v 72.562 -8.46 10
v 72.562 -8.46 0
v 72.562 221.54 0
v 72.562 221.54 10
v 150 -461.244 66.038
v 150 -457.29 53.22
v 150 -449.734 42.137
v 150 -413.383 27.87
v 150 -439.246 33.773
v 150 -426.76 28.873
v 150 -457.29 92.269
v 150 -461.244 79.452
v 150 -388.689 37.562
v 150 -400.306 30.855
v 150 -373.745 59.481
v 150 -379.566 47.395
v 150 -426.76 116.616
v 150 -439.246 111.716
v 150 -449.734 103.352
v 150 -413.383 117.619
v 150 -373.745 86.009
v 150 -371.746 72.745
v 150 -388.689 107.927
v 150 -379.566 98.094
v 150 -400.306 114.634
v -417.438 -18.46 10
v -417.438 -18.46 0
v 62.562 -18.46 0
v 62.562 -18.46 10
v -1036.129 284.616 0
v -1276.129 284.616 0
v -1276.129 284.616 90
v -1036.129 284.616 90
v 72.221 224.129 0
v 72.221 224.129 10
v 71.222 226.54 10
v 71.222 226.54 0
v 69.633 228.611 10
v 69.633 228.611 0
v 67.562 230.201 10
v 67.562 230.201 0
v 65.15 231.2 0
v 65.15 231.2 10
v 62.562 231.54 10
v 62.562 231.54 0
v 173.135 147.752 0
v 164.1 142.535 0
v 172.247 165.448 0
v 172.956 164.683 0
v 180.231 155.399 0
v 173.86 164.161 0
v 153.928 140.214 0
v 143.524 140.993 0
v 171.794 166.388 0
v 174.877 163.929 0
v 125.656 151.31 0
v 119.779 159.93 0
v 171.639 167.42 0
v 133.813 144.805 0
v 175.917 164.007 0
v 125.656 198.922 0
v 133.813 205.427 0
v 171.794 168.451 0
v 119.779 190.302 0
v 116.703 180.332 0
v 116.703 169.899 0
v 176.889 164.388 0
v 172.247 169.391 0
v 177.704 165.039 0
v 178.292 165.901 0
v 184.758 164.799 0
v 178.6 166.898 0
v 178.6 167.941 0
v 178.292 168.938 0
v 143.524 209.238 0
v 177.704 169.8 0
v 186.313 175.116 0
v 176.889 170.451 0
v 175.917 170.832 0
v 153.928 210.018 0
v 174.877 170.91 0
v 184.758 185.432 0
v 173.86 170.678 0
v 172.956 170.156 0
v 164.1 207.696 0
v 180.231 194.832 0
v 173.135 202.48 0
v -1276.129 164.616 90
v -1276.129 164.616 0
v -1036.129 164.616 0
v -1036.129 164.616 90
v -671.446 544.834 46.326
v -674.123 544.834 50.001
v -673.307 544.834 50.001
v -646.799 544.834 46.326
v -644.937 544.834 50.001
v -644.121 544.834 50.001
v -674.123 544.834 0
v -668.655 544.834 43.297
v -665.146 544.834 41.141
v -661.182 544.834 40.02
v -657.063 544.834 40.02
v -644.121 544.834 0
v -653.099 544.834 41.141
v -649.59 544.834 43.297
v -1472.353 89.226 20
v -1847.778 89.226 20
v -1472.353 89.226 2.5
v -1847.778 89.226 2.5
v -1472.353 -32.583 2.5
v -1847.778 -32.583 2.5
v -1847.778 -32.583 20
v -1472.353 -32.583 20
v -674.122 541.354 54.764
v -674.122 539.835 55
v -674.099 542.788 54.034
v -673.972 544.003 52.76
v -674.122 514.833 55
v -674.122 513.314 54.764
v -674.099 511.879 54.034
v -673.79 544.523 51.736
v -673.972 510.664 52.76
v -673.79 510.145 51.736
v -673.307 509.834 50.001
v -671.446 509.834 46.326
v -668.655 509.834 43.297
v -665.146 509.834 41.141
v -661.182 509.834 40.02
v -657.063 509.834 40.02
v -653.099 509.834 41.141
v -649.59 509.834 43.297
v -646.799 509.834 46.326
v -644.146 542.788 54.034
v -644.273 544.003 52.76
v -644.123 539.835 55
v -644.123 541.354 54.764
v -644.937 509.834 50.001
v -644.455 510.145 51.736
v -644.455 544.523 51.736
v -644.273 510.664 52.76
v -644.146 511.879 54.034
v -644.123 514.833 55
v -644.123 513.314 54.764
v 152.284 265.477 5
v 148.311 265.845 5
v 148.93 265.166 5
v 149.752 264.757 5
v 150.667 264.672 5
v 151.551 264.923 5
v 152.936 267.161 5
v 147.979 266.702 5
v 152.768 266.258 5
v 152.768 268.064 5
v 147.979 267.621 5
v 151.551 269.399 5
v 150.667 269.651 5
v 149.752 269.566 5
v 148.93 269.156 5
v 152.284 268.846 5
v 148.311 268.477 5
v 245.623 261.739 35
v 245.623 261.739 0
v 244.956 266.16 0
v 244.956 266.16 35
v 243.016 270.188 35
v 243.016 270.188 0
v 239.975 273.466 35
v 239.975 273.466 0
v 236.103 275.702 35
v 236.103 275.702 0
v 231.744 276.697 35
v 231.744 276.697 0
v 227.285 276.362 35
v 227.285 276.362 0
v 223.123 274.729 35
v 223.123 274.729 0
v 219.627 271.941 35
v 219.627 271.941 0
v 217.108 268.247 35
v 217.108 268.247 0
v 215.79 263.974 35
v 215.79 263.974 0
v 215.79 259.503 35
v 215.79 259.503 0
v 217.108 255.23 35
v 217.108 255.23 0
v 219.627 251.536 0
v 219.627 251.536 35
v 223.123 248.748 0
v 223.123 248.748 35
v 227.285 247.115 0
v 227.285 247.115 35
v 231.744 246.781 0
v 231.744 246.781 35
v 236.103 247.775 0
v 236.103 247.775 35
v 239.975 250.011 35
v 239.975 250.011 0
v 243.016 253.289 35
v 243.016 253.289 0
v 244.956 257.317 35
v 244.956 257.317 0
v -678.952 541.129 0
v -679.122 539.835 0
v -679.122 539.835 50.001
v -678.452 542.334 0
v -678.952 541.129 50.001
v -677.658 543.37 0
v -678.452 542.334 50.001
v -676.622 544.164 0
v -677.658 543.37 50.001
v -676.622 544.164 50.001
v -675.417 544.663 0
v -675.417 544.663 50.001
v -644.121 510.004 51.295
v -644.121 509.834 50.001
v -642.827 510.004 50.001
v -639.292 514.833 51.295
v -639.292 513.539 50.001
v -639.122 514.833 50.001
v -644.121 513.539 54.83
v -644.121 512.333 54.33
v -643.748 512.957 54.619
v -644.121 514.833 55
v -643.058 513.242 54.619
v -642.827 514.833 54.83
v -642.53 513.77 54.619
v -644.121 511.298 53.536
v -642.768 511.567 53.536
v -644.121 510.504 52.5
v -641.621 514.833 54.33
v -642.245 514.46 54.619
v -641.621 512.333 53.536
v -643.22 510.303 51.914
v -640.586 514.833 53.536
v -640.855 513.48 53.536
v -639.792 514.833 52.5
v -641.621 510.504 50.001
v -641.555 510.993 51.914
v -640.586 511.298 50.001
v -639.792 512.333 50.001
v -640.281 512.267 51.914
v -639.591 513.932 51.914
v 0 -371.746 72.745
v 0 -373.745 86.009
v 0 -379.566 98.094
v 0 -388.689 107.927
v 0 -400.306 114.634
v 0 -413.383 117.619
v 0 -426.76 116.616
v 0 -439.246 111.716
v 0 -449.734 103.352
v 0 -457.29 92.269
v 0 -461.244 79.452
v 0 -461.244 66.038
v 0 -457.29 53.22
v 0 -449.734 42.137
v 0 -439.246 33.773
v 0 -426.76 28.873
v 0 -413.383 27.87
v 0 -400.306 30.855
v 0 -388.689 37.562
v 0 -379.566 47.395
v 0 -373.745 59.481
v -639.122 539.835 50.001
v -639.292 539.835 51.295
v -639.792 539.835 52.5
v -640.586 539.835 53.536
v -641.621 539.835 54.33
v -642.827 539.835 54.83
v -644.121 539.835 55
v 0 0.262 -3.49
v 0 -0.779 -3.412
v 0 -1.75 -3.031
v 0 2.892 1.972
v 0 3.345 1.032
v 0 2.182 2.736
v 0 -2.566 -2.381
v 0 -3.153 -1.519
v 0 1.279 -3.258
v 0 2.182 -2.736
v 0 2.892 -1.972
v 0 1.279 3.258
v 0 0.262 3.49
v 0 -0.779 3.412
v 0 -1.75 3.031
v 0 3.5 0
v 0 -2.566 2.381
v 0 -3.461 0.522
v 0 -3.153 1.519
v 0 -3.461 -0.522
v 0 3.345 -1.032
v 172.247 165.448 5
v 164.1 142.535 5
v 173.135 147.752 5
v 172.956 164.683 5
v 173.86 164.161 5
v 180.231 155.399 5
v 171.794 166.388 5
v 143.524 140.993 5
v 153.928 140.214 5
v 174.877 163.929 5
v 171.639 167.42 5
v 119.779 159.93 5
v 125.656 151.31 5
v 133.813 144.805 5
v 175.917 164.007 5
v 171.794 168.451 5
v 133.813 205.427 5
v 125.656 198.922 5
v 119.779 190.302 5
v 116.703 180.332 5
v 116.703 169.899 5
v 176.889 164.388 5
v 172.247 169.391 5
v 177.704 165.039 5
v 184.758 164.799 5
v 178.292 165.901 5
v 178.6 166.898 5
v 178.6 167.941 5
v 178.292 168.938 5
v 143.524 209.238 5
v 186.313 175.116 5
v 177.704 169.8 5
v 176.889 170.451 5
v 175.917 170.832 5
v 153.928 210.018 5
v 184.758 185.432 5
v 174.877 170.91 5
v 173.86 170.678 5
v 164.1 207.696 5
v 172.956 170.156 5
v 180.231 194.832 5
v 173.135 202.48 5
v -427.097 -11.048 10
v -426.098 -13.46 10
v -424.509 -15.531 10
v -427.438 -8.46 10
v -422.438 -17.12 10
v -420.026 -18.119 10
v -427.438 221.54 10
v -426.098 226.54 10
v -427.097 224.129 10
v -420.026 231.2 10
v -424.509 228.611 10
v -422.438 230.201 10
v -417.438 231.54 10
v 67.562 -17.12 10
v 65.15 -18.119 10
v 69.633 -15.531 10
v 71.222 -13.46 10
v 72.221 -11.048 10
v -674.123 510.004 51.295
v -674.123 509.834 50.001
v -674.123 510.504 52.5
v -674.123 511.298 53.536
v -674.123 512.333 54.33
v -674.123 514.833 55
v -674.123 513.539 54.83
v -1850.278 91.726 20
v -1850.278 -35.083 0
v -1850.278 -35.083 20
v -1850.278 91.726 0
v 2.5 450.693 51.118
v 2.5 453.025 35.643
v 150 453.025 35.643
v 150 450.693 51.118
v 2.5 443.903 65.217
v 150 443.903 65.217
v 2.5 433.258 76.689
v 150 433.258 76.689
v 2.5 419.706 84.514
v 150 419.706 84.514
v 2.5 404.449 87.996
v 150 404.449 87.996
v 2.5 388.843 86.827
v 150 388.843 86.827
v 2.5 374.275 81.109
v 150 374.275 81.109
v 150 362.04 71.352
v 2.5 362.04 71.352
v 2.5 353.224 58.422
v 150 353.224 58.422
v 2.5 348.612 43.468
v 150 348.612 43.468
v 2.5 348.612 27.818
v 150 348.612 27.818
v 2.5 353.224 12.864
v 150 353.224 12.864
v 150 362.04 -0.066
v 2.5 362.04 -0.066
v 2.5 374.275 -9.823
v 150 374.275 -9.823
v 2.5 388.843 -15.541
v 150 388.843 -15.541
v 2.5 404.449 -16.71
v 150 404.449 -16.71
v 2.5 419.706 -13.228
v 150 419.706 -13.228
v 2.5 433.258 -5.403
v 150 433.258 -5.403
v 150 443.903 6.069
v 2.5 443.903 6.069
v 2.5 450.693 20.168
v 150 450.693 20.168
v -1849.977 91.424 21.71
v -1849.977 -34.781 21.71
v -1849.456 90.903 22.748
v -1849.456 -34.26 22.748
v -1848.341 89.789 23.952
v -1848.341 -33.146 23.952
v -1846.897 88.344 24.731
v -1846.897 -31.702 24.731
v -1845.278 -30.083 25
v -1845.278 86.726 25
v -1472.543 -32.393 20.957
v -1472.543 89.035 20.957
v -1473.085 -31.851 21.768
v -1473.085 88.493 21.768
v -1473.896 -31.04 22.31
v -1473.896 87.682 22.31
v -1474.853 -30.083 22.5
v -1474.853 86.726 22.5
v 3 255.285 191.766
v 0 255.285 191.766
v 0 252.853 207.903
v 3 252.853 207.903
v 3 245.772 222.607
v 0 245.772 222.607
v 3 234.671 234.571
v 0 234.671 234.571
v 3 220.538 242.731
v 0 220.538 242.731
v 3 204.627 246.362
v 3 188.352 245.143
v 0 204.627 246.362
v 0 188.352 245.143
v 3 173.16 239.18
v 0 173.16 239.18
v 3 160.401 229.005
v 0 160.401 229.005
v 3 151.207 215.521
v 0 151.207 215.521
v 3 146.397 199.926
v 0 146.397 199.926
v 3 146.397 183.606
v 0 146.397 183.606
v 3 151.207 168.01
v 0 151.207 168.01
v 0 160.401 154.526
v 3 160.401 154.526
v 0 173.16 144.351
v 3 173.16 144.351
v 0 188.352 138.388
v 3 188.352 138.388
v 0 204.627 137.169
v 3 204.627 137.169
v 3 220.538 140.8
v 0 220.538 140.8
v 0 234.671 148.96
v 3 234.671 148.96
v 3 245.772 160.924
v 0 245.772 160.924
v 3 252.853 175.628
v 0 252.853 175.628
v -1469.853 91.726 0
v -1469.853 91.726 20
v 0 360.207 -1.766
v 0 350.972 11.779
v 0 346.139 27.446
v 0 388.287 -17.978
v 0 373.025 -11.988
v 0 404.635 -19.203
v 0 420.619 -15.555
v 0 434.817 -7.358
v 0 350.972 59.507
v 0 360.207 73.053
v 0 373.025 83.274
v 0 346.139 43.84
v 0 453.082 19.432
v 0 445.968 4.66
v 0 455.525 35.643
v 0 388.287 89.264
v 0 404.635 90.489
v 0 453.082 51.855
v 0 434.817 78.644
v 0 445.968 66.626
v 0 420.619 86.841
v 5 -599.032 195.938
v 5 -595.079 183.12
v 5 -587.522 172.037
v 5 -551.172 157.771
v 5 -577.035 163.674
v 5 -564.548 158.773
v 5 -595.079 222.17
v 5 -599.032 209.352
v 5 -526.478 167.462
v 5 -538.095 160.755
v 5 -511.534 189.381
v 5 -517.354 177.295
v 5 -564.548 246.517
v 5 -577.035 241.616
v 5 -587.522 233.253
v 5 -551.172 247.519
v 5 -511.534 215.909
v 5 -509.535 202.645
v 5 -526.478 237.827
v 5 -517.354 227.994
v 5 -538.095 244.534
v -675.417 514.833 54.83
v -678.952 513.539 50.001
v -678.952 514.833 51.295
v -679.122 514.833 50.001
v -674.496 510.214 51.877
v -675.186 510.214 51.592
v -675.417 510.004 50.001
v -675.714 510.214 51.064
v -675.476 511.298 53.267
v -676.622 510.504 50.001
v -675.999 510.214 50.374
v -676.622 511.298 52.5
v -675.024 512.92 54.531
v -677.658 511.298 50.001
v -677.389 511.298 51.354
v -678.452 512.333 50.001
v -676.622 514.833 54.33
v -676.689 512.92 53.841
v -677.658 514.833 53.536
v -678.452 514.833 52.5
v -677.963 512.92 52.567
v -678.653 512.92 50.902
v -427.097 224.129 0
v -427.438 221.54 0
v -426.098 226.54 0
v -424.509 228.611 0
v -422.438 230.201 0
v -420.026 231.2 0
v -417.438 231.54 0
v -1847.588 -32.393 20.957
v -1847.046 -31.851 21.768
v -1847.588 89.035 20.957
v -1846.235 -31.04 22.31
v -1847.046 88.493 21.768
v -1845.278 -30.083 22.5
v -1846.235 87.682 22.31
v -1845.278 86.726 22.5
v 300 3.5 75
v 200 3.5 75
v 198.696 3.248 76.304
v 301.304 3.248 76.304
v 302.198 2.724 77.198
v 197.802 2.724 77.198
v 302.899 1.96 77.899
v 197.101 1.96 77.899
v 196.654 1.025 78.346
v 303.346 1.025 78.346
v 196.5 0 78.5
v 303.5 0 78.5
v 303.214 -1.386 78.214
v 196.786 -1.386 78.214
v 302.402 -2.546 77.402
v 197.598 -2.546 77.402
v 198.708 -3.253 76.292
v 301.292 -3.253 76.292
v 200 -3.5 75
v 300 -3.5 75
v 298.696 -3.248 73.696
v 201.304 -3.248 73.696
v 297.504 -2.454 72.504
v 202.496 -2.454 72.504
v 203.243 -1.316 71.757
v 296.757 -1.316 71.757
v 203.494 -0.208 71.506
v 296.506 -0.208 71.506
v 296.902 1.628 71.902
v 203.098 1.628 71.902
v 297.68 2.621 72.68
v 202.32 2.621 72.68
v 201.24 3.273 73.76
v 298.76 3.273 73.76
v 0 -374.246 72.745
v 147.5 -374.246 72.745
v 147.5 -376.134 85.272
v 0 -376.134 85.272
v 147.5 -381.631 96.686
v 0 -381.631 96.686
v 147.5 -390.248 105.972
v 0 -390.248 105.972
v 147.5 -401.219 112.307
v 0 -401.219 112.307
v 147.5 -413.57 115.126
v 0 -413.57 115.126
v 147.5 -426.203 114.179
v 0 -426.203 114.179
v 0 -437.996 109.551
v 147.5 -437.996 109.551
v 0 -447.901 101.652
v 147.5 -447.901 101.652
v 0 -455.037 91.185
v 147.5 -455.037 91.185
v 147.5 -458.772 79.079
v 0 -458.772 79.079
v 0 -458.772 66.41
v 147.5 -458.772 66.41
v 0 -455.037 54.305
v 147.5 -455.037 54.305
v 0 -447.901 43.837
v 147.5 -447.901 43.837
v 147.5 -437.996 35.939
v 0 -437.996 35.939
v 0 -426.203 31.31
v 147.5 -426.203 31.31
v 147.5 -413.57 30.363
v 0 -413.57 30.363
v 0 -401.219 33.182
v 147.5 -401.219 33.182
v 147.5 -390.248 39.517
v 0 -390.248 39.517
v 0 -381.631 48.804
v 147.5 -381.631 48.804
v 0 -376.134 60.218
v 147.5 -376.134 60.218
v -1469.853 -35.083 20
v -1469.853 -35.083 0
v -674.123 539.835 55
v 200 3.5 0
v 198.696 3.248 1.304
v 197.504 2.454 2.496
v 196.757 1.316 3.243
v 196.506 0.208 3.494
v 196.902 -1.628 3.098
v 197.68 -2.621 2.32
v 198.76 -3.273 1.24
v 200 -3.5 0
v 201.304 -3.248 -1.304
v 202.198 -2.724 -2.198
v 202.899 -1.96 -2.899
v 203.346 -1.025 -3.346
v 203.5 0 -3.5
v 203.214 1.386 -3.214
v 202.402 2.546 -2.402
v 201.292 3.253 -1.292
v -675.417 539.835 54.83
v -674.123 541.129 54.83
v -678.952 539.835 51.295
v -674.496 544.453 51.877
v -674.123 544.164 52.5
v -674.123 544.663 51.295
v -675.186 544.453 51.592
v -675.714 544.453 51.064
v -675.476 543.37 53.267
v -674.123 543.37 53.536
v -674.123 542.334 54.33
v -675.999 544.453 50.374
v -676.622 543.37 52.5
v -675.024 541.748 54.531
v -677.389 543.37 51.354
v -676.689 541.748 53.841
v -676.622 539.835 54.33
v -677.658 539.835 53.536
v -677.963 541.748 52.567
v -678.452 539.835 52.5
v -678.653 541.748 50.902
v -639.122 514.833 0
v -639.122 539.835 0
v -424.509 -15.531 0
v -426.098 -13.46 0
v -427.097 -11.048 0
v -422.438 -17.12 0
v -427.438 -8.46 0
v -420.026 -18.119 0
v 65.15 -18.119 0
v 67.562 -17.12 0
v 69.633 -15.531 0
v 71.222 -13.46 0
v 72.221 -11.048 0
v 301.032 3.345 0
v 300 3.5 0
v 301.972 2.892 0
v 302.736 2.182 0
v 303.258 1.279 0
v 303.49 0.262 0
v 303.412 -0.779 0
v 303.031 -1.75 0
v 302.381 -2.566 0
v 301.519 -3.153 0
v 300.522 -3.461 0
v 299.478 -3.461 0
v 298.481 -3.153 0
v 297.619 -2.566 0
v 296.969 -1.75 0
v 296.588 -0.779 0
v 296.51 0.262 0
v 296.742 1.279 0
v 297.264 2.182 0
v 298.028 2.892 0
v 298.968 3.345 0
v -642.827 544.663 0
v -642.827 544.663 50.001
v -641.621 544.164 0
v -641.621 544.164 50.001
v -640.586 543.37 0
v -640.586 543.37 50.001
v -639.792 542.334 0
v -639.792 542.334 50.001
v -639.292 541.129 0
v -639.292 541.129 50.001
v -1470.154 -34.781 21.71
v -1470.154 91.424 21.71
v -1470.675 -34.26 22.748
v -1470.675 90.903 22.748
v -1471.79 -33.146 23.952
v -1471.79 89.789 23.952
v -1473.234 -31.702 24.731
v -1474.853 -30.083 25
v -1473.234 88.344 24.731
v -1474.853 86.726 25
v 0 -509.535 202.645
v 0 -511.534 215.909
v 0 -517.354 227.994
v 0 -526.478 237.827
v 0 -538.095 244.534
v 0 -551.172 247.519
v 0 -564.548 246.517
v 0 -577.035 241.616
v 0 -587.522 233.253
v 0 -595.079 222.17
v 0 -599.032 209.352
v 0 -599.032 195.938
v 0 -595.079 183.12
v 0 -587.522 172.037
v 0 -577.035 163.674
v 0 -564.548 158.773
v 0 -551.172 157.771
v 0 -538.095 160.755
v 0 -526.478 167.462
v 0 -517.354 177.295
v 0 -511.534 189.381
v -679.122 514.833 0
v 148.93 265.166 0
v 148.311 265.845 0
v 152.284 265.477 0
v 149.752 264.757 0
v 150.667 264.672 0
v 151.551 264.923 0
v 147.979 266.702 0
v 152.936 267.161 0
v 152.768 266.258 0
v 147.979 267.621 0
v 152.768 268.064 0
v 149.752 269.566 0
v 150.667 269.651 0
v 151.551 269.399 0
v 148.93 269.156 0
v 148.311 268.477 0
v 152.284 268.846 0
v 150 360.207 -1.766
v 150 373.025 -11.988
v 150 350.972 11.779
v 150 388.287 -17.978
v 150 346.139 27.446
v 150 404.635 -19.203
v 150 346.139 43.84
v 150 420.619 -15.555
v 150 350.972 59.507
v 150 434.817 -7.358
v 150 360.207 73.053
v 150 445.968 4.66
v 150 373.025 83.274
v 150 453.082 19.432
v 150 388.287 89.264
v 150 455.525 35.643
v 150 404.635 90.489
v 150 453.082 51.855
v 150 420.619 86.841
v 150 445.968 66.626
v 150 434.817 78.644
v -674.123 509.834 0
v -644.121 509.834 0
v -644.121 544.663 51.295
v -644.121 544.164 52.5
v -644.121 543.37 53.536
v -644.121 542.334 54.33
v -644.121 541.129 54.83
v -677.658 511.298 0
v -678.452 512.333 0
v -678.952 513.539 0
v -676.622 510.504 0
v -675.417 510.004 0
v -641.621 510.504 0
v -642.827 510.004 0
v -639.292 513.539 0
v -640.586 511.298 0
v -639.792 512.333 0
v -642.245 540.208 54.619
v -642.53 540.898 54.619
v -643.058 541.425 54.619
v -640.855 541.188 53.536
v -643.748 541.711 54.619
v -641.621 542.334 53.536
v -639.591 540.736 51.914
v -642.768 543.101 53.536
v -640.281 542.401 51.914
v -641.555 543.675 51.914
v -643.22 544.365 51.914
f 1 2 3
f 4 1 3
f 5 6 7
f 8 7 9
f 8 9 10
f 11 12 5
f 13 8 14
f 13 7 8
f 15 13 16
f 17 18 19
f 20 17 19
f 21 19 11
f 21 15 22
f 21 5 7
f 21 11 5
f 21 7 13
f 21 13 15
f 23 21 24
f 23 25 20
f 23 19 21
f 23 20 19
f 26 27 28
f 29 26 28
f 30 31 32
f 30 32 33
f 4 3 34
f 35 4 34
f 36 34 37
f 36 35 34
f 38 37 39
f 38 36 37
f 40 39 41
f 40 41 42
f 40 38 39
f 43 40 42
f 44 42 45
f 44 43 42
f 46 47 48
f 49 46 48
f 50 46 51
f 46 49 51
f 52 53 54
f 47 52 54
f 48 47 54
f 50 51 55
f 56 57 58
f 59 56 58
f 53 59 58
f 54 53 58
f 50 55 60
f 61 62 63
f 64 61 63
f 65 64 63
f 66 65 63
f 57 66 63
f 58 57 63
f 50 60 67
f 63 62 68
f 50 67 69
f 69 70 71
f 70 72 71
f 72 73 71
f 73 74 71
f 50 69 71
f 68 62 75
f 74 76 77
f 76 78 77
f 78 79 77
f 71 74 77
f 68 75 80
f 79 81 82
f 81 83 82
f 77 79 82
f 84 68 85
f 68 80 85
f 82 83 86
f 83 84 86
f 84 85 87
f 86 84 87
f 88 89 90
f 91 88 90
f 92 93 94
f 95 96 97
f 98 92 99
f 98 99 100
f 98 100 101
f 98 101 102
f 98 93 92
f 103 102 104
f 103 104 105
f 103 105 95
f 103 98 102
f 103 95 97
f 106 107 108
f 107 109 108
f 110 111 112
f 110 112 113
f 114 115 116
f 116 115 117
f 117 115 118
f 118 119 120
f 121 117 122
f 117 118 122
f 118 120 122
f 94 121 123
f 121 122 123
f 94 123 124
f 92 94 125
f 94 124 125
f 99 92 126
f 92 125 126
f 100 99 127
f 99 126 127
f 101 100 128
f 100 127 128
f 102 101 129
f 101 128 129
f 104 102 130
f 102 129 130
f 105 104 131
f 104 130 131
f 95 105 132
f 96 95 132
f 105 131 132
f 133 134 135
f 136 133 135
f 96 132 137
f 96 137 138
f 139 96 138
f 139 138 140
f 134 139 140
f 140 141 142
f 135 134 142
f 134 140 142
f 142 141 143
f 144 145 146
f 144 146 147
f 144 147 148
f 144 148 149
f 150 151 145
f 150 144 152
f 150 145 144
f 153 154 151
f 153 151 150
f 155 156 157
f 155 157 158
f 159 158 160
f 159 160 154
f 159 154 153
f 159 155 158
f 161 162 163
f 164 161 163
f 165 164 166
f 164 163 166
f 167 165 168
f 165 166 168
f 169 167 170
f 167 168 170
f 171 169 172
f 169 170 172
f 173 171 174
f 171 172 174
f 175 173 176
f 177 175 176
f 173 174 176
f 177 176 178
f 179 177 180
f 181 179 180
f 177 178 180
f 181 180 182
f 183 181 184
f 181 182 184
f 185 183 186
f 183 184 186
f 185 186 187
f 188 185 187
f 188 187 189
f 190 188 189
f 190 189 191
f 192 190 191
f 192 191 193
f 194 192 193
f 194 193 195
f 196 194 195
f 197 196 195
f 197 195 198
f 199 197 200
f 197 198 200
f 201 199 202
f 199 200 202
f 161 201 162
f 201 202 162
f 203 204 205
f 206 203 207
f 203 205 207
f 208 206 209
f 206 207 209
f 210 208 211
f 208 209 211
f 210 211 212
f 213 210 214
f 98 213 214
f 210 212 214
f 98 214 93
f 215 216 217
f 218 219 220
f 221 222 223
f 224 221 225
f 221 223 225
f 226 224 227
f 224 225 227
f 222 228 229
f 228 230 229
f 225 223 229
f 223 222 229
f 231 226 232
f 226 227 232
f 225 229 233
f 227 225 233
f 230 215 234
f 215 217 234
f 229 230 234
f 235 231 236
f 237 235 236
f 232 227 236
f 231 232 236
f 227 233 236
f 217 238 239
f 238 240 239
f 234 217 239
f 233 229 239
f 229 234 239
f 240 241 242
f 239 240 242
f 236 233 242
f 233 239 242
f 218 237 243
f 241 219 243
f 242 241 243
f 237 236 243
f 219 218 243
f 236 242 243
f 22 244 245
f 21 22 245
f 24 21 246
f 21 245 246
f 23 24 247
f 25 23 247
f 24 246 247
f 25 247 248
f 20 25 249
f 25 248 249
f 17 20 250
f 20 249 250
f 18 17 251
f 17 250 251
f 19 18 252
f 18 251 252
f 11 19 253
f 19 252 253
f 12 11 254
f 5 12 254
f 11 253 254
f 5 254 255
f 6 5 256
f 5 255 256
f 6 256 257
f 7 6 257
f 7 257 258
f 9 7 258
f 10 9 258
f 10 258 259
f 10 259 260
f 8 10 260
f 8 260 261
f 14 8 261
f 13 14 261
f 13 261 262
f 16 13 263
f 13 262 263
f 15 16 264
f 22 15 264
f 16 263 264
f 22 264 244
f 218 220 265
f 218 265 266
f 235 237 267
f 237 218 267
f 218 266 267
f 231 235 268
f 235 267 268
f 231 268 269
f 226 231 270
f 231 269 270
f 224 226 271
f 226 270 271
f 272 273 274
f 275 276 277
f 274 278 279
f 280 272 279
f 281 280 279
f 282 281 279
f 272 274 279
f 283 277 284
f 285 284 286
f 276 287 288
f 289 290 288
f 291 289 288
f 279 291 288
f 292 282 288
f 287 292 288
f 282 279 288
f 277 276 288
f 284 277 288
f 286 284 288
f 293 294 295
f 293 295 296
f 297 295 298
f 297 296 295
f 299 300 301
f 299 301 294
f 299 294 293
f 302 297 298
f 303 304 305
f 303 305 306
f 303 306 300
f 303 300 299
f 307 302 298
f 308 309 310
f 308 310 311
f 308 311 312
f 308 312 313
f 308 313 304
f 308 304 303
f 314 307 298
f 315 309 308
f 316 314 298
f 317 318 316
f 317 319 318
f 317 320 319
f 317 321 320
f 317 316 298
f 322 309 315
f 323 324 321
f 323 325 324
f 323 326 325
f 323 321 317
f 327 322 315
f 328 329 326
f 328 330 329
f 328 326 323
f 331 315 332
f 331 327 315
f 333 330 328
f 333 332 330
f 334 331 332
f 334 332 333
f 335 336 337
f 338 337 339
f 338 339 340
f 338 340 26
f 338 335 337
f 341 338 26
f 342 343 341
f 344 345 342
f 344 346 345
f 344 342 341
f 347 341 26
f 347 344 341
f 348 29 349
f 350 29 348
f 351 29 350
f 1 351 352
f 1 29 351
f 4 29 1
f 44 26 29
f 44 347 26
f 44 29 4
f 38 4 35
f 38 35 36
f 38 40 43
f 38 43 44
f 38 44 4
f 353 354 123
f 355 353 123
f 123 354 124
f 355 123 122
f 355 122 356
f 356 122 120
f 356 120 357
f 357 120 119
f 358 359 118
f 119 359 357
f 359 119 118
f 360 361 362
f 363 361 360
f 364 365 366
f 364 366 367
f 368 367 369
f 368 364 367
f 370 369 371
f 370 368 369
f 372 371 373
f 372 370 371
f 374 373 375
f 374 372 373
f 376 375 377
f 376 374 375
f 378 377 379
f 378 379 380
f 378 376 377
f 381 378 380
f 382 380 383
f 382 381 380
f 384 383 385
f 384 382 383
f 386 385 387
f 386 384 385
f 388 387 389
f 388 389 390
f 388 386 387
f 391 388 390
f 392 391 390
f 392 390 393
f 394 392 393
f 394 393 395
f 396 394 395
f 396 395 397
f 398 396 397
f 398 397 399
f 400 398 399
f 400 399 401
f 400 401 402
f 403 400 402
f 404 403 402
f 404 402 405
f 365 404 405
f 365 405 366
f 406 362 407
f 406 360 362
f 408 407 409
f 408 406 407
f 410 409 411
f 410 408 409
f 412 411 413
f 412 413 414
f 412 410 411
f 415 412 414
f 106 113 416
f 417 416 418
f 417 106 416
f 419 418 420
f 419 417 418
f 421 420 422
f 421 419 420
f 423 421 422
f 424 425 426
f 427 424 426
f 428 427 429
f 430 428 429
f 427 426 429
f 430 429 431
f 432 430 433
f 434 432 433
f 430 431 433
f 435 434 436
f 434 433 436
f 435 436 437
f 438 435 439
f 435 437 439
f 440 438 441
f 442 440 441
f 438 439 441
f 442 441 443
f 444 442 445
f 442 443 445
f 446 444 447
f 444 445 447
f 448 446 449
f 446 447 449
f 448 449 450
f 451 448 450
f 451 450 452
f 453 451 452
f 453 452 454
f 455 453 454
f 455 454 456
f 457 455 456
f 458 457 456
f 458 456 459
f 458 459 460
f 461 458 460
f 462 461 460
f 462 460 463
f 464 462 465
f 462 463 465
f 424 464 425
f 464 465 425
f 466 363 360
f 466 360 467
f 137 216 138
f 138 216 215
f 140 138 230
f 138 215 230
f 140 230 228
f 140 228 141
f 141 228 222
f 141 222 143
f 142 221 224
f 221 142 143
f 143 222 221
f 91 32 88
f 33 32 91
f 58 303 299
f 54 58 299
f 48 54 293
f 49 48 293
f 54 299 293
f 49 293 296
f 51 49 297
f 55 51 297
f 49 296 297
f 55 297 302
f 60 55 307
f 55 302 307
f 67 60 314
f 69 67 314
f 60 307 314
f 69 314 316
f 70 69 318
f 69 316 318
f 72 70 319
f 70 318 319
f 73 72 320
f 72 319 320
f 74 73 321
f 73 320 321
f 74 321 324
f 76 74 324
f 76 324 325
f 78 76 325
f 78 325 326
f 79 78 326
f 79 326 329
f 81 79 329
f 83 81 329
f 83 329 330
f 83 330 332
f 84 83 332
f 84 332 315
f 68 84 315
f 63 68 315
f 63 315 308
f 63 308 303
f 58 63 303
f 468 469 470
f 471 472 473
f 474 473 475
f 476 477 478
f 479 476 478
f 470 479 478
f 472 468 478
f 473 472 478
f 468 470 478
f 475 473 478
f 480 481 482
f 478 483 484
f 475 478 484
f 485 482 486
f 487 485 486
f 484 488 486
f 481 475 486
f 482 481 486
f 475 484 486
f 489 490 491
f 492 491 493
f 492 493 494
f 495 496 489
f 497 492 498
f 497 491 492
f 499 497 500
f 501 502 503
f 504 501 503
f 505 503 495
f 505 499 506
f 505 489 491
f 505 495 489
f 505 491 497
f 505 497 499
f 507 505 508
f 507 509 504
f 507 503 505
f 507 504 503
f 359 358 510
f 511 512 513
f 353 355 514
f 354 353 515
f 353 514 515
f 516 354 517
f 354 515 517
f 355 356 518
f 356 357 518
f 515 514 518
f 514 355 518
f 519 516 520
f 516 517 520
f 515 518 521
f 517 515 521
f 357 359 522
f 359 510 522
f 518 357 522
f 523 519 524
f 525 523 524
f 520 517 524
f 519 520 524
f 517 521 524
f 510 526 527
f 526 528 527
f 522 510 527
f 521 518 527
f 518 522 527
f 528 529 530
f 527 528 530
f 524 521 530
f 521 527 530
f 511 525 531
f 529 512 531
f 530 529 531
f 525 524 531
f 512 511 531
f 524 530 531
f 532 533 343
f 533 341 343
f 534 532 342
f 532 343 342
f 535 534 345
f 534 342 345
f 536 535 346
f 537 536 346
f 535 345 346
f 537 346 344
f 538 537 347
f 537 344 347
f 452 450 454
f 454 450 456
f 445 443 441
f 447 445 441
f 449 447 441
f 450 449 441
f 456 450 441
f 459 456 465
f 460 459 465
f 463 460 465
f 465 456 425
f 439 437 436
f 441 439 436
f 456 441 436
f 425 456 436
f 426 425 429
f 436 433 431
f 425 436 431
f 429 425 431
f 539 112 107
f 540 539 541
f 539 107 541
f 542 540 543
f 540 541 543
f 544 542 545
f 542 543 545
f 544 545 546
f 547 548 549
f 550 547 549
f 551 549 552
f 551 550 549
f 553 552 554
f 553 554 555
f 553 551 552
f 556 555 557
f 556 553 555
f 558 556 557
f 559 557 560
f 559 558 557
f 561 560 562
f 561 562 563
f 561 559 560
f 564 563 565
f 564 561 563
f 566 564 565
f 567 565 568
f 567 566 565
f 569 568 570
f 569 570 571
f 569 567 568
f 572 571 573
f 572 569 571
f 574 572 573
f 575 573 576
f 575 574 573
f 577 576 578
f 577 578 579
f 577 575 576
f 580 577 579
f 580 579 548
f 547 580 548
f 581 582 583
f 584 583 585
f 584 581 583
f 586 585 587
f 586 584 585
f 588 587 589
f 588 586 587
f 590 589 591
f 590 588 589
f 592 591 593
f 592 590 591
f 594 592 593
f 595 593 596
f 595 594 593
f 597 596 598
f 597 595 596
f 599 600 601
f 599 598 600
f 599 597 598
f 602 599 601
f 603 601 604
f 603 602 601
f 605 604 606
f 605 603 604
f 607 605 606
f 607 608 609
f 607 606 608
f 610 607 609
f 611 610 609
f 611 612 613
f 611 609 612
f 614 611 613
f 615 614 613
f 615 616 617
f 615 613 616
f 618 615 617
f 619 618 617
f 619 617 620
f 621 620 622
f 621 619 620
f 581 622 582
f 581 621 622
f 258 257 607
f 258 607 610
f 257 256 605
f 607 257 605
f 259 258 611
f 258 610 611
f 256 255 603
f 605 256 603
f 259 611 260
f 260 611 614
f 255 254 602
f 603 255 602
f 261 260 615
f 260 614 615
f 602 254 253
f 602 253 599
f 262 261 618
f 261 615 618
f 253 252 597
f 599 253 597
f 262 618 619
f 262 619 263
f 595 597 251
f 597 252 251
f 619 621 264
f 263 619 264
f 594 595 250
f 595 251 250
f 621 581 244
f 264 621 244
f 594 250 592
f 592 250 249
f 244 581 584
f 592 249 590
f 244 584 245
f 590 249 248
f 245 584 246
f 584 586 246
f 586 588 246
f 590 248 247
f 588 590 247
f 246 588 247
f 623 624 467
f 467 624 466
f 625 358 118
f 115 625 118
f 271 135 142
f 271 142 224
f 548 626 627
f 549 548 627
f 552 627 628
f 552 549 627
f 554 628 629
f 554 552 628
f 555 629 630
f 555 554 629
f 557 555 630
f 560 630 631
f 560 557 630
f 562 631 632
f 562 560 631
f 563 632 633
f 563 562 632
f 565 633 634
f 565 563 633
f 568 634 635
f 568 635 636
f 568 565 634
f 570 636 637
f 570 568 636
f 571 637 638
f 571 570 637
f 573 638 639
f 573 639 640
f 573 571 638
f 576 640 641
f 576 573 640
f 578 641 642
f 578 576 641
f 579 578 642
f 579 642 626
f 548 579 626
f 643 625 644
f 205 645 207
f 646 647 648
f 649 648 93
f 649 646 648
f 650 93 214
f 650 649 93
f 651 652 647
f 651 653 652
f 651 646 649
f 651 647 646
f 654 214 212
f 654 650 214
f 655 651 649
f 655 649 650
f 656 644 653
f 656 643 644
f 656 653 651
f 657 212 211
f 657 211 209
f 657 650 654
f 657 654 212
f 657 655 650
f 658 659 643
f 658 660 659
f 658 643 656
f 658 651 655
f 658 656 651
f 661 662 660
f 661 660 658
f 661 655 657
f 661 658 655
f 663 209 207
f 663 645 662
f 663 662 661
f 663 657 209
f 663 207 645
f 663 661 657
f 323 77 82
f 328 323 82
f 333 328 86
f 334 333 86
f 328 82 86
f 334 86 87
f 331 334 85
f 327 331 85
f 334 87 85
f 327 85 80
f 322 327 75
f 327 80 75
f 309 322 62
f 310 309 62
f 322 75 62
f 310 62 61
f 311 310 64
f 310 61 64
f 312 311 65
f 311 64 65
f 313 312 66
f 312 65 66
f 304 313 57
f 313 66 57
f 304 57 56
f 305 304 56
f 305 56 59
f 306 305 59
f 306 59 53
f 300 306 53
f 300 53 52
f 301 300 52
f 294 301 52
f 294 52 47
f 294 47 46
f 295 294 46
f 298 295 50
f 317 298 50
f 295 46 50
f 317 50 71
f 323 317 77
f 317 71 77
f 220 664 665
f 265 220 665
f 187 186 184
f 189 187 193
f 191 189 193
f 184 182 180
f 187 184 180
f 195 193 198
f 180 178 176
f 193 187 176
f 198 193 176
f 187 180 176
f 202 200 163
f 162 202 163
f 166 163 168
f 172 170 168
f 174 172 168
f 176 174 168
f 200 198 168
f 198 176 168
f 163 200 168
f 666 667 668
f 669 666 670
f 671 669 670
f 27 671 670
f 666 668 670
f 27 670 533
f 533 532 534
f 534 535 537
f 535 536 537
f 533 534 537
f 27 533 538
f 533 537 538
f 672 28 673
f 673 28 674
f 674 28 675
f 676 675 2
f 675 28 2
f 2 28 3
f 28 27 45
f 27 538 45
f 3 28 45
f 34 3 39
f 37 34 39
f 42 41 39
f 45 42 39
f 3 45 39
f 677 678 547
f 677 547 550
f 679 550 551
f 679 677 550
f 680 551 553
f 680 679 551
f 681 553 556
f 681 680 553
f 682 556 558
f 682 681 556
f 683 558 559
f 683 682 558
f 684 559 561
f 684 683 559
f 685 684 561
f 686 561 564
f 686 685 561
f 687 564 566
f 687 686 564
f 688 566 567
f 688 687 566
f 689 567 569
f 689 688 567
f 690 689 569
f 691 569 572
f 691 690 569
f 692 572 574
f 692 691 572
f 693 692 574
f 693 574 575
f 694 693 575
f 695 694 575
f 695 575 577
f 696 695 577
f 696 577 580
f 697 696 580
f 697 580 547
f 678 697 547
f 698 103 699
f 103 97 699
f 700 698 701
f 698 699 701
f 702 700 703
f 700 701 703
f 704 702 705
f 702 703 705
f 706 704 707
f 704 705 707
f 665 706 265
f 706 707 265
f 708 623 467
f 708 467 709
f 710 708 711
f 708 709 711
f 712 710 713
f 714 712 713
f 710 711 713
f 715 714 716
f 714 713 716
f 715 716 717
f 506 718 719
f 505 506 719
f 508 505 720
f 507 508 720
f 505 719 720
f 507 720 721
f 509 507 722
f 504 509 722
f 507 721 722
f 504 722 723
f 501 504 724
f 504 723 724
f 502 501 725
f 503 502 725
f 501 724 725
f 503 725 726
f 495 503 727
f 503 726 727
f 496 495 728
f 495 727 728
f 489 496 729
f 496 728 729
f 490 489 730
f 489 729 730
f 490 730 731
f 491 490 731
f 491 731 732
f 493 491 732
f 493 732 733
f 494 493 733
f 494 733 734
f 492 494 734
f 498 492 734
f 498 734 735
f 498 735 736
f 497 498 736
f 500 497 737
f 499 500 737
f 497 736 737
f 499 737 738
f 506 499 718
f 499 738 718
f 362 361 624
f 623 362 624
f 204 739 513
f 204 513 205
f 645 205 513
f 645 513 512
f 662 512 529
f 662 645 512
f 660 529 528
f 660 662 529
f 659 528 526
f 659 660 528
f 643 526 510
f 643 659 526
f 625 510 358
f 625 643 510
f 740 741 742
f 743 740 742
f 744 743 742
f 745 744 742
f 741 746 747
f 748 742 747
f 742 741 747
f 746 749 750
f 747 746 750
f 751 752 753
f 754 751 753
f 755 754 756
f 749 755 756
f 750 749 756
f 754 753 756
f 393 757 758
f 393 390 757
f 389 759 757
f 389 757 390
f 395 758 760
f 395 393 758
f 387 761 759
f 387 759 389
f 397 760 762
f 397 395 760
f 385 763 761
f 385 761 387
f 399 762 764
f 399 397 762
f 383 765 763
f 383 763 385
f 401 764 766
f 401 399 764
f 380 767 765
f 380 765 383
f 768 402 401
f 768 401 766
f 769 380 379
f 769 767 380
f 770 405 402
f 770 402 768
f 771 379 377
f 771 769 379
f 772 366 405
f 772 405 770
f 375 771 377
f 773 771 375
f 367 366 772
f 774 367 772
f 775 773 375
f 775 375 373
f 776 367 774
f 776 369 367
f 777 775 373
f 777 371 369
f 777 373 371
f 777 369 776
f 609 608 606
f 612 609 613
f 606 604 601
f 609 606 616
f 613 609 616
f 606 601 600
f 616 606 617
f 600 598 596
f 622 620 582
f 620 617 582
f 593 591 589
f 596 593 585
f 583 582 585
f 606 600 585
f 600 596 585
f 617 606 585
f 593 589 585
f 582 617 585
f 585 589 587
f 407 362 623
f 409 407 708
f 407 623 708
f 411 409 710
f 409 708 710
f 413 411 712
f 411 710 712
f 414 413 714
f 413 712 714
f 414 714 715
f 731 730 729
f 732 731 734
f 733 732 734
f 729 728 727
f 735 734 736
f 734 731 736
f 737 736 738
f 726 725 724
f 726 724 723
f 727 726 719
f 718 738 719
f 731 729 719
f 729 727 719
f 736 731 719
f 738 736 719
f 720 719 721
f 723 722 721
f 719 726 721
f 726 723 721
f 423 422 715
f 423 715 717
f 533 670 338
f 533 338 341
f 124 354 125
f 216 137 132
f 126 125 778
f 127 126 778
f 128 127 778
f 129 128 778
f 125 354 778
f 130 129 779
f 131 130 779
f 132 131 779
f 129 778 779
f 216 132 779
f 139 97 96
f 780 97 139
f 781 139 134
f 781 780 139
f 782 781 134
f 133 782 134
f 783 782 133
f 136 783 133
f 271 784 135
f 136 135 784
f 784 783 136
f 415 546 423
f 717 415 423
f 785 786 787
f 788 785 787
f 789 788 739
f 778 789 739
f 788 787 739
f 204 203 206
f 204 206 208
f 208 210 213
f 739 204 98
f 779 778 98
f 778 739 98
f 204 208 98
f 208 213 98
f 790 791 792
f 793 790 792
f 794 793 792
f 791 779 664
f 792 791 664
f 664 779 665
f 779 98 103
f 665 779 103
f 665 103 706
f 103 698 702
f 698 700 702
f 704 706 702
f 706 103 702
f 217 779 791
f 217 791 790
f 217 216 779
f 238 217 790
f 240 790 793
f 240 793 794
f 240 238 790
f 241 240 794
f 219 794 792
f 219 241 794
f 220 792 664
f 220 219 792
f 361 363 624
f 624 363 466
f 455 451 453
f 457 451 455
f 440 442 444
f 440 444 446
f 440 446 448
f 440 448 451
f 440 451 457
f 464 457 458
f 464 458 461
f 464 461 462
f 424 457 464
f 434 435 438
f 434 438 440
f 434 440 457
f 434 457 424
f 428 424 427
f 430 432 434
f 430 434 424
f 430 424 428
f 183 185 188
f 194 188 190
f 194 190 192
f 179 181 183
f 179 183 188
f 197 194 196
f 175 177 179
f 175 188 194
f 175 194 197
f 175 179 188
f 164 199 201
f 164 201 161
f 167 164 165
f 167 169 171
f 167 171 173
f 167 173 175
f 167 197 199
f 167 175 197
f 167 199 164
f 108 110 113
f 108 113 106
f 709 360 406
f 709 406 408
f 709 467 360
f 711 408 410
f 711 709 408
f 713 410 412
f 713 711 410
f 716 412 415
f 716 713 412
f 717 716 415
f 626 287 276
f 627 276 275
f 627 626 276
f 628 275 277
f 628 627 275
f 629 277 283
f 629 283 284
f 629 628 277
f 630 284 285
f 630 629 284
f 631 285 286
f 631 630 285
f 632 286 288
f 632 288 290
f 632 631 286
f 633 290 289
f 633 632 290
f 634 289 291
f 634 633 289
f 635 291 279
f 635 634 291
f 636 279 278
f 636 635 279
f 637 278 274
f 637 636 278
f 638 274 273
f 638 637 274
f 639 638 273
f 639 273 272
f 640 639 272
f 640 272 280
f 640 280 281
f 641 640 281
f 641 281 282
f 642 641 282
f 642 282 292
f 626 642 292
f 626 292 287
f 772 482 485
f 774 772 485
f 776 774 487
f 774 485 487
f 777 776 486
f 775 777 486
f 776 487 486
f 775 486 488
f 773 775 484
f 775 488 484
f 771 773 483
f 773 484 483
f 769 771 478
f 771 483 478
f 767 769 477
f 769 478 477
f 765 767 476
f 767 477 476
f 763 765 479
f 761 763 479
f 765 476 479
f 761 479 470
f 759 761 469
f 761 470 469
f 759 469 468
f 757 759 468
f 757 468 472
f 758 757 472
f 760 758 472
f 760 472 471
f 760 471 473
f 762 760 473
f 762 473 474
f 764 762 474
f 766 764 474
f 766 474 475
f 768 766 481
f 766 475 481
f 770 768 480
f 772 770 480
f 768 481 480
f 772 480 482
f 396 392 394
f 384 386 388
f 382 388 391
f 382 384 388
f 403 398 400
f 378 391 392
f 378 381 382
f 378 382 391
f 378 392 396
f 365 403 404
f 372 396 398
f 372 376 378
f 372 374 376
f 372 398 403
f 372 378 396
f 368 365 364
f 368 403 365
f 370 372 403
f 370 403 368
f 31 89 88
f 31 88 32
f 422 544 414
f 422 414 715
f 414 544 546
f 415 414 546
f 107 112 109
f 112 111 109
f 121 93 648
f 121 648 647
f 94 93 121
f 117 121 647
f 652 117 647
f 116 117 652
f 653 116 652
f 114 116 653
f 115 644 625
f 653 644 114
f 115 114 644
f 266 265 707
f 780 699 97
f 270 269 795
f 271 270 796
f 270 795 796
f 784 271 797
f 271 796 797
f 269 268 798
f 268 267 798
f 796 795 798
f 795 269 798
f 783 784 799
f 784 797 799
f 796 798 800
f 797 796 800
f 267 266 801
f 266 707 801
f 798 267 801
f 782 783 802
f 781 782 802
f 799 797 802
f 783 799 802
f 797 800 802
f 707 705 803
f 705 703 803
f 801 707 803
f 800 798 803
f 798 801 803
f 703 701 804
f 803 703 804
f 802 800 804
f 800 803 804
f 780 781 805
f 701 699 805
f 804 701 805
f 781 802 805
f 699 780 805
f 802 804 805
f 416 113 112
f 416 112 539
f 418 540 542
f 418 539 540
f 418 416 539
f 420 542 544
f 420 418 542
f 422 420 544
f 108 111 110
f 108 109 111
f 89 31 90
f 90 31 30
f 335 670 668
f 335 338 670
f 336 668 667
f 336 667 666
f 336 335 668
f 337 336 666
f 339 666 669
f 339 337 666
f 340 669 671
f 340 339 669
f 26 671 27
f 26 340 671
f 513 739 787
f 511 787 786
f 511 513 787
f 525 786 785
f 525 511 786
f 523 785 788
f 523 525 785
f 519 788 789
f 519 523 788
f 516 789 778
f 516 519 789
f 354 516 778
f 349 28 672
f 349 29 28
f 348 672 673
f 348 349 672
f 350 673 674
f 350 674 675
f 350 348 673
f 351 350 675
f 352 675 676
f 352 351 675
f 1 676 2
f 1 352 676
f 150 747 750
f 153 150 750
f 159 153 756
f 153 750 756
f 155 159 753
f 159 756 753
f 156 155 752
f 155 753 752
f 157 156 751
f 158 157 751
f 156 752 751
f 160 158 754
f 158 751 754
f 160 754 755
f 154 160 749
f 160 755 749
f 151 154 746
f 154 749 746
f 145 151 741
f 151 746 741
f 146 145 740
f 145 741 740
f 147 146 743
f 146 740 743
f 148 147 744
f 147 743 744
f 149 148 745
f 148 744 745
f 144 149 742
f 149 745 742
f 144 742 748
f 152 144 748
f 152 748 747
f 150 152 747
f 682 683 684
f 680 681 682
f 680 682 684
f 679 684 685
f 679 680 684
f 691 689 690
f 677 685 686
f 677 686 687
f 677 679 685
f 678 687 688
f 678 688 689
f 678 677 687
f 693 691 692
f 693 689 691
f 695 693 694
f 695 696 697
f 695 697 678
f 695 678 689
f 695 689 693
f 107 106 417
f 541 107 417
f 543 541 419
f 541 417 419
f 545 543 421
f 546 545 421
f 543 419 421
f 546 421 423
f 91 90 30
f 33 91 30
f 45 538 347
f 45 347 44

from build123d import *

# Parameters (mm, degrees)
F0_W      = 500
F0_H      = 250
F1_DEPTH  = 10
F2_R      = 55
F3_DEPTH  = 150
F4_T      = -2.5
F5_R      = 10
F6_R      = 54.75
F7_DEPTH  = 3
F9_R      = 3.5
F11_R     = 35
F12_DEPTH = 5
F13_R     = 15
F14_DEPTH = 35
F15_R     = 2.5
F16_DEPTH = 5
F17_W     = 40
F17_H     = 35
F18_DEPTH = 55
F20_DEPTH = 40
F21_R     = 4.999
F23_D     = 7
F24_W     = 240
F24_H     = 120
F25_DEPTH = 90
F26_R     = 45
F27_DEPTH = 150
F28_T     = -2.5
F29_R     = 45
F30_DEPTH = 5
F31_W     = 380.425453186
F31_H     = 126.8084421754
F32_DEPTH = 25
F33_R     = 5
F34_T     = -2.5


# Not quite as in the source:
# - a fillet or chamfer is up to 0.001 mm smaller than in the source, because OpenCascade refuses the exact size
# - a shell that OpenCascade refuses in one call is made with other operations: the cavity is built on its own and cut out


with BuildPart() as f1:
    # F0 (on Top) → F1 (new body)
    with BuildSketch(Plane.XY):
        with Locations((-177.4380993843, 106.5403278917)):
            Rectangle(F0_W, F0_H)
    extrude(amount=F1_DEPTH)

    # F5
    f5_edges = [f1.edges().sort_by_distance(p)[0] for p in [
        (72.561901, 231.540328, 5),
        (-427.438099, 231.540328, 5),
        (-427.438099, -18.459672, 5),
        (72.561901, -18.459672, 5),
    ]]
    fillet(f5_edges, radius=F5_R)


with BuildPart() as f3:
    # F2 (on Right) → F3 (new body)
    with BuildSketch(Plane.YZ):
        with Locations((400.5251824856, 35.6430858374)):
            Circle(F2_R)
    extrude(amount=F3_DEPTH)

    # F4
    f4_openings = [f3.faces().sort_by_distance(p)[0] for p in [
        (150, 400.525182, 35.643086),
    ]]
    offset(amount=F4_T, openings=f4_openings)


with BuildPart() as f7:
    # F6 (on Right) → F7 (new body)
    with BuildSketch(Plane.YZ):
        with Locations((200.5351930857, 191.765576601)):
            Circle(F6_R)
    extrude(amount=F7_DEPTH)


with BuildPart() as f10:
    # F10: sweep along a path in F8
    with BuildLine(Plane.XZ) as f10_path:
        Line((0, 0), (200, 0))
        Line((200, 0), (200, 75))
        Line((200, 75), (300, 75))
        Line((300, 75), (300, 0))
    # F9 (on Right) → F10 (sweep)
    with BuildSketch(Plane.YZ):
        Circle(F9_R)
    sweep(path=f10_path.line, transition=Transition.RIGHT)


with BuildPart() as f12:
    # F11 (on Top) → F12 (new body)
    with BuildSketch(Plane.XY):
        with Locations((151.3125747442, 175.1156896353)):
            Circle(F11_R)
    extrude(amount=F12_DEPTH)

    # F23 (through all)
    with Locations(Plane(origin=(0, 0, 0), x_dir=(1, 0, 0), z_dir=(0, 0, -1))):
        with Locations((175.1386225224, -167.4195230007)):
            Hole(F23_D / 2)


with BuildPart() as f14:
    # F13 (on Top) → F14 (new body)
    with BuildSketch(Plane.XY):
        with Locations((230.6227236986, 261.7385685444)):
            Circle(F13_R)
    extrude(amount=F14_DEPTH)


with BuildPart() as f16:
    # F15 (on Top) → F16 (new body)
    with BuildSketch(Plane.XY):
        with Locations((150.4363566637, 267.1612799168)):
            Circle(F15_R)
    extrude(amount=F16_DEPTH)


with BuildPart() as f18:
    # F17 (on Top) → F18 (new body)
    with BuildSketch(Plane.XY):
        with Locations((-659.1219115257, 527.3338127136)):
            Rectangle(F17_W, F17_H)
    extrude(amount=F18_DEPTH)

    # F19 (on face) → F20 (cut)
    with BuildSketch(Plane.XZ.offset(-509.8338127136)):
        with BuildLine():
            Line((-644.1229029035, 55), (-674.1219115257, 55))
            ThreePointArc((-674.1219115257, 55), (-659.1224072146, 39.8780556624), (-644.1229029035, 55))
        make_face()
    extrude(amount=-F20_DEPTH, mode=Mode.SUBTRACT)

    # F21 (radius 5 in the source; OpenCascade refuses exactly that, so slightly less here)
    f21_edges = [f18.edges().sort_by_distance(p)[0] for p in [
        (-679.121912, 527.333813, 55),
        (-676.621912, 509.833813, 55),
        (-679.121912, 509.833813, 27.5),
        (-639.121912, 509.833813, 27.5),
        (-641.622407, 509.833813, 55),
        (-639.121912, 544.833813, 27.5),
        (-639.121912, 527.333813, 55),
        (-641.622407, 544.833813, 55),
        (-676.621912, 544.833813, 55),
        (-679.121912, 544.833813, 27.5),
    ]]
    fillet(f21_edges, radius=F21_R)


with BuildPart() as f25:
    # F24 (on Top) → F25 (new body)
    with BuildSketch(Plane.XY):
        with Locations((-1156.1287093163, 224.6164506674)):
            Rectangle(F24_W, F24_H)
    extrude(amount=F25_DEPTH)


with BuildPart() as f27:
    # F26 (on Right) → F27 (new body)
    with BuildSketch(Plane.YZ):
        with Locations((-416.7462587357, 72.744615376)):
            Circle(F26_R)
    extrude(amount=F27_DEPTH)

    # F28
    f28_openings = [f27.faces().sort_by_distance(p)[0] for p in [
        (0, -416.746259, 72.744615),
    ]]
    offset(amount=F28_T, openings=f28_openings)


with BuildPart() as f30:
    # F29 (on Right) → F30 (new body)
    with BuildSketch(Plane.YZ):
        with Locations((-554.5350313187, 202.644765377)):
            Circle(F29_R)
    extrude(amount=F30_DEPTH)


with BuildPart() as f32:
    # F31 (on Top) → F32 (new body)
    with BuildSketch(Plane.XY):
        with Locations((-1660.0656509399, 28.3213891089)):
            Rectangle(F31_W, F31_H)
    extrude(amount=F32_DEPTH)

    # F33
    f33_edges = [f32.edges().sort_by_distance(p)[0] for p in [
        (-1660.065651, -35.082832, 25),
        (-1469.852924, 28.321389, 25),
        (-1660.065651, 91.72561, 25),
        (-1850.278378, 28.321389, 25),
    ]]
    fillet(f33_edges, radius=F33_R)

    # F34: a shell. OpenCascade refuses it in one call, so the cavity is built on its own and cut out:
    # the body offset inwards by the wall thickness, plus a prism from it out through each open face.
    f34_core = offset(f32.part, amount=F34_T, mode=Mode.PRIVATE)
    f34_exits = [f34_core.faces().sort_by_distance(p)[0] for p in [
        (-1660.065651, 28.321389, 22.5),
    ]]
    add(f34_core, mode=Mode.SUBTRACT)
    extrude(f34_exits, amount=-F34_T, mode=Mode.SUBTRACT)


solid = Compound([f1.part, f3.part, f7.part, f10.part, f12.part, f14.part, f16.part, f18.part, f25.part, f27.part, f30.part, f32.part])
